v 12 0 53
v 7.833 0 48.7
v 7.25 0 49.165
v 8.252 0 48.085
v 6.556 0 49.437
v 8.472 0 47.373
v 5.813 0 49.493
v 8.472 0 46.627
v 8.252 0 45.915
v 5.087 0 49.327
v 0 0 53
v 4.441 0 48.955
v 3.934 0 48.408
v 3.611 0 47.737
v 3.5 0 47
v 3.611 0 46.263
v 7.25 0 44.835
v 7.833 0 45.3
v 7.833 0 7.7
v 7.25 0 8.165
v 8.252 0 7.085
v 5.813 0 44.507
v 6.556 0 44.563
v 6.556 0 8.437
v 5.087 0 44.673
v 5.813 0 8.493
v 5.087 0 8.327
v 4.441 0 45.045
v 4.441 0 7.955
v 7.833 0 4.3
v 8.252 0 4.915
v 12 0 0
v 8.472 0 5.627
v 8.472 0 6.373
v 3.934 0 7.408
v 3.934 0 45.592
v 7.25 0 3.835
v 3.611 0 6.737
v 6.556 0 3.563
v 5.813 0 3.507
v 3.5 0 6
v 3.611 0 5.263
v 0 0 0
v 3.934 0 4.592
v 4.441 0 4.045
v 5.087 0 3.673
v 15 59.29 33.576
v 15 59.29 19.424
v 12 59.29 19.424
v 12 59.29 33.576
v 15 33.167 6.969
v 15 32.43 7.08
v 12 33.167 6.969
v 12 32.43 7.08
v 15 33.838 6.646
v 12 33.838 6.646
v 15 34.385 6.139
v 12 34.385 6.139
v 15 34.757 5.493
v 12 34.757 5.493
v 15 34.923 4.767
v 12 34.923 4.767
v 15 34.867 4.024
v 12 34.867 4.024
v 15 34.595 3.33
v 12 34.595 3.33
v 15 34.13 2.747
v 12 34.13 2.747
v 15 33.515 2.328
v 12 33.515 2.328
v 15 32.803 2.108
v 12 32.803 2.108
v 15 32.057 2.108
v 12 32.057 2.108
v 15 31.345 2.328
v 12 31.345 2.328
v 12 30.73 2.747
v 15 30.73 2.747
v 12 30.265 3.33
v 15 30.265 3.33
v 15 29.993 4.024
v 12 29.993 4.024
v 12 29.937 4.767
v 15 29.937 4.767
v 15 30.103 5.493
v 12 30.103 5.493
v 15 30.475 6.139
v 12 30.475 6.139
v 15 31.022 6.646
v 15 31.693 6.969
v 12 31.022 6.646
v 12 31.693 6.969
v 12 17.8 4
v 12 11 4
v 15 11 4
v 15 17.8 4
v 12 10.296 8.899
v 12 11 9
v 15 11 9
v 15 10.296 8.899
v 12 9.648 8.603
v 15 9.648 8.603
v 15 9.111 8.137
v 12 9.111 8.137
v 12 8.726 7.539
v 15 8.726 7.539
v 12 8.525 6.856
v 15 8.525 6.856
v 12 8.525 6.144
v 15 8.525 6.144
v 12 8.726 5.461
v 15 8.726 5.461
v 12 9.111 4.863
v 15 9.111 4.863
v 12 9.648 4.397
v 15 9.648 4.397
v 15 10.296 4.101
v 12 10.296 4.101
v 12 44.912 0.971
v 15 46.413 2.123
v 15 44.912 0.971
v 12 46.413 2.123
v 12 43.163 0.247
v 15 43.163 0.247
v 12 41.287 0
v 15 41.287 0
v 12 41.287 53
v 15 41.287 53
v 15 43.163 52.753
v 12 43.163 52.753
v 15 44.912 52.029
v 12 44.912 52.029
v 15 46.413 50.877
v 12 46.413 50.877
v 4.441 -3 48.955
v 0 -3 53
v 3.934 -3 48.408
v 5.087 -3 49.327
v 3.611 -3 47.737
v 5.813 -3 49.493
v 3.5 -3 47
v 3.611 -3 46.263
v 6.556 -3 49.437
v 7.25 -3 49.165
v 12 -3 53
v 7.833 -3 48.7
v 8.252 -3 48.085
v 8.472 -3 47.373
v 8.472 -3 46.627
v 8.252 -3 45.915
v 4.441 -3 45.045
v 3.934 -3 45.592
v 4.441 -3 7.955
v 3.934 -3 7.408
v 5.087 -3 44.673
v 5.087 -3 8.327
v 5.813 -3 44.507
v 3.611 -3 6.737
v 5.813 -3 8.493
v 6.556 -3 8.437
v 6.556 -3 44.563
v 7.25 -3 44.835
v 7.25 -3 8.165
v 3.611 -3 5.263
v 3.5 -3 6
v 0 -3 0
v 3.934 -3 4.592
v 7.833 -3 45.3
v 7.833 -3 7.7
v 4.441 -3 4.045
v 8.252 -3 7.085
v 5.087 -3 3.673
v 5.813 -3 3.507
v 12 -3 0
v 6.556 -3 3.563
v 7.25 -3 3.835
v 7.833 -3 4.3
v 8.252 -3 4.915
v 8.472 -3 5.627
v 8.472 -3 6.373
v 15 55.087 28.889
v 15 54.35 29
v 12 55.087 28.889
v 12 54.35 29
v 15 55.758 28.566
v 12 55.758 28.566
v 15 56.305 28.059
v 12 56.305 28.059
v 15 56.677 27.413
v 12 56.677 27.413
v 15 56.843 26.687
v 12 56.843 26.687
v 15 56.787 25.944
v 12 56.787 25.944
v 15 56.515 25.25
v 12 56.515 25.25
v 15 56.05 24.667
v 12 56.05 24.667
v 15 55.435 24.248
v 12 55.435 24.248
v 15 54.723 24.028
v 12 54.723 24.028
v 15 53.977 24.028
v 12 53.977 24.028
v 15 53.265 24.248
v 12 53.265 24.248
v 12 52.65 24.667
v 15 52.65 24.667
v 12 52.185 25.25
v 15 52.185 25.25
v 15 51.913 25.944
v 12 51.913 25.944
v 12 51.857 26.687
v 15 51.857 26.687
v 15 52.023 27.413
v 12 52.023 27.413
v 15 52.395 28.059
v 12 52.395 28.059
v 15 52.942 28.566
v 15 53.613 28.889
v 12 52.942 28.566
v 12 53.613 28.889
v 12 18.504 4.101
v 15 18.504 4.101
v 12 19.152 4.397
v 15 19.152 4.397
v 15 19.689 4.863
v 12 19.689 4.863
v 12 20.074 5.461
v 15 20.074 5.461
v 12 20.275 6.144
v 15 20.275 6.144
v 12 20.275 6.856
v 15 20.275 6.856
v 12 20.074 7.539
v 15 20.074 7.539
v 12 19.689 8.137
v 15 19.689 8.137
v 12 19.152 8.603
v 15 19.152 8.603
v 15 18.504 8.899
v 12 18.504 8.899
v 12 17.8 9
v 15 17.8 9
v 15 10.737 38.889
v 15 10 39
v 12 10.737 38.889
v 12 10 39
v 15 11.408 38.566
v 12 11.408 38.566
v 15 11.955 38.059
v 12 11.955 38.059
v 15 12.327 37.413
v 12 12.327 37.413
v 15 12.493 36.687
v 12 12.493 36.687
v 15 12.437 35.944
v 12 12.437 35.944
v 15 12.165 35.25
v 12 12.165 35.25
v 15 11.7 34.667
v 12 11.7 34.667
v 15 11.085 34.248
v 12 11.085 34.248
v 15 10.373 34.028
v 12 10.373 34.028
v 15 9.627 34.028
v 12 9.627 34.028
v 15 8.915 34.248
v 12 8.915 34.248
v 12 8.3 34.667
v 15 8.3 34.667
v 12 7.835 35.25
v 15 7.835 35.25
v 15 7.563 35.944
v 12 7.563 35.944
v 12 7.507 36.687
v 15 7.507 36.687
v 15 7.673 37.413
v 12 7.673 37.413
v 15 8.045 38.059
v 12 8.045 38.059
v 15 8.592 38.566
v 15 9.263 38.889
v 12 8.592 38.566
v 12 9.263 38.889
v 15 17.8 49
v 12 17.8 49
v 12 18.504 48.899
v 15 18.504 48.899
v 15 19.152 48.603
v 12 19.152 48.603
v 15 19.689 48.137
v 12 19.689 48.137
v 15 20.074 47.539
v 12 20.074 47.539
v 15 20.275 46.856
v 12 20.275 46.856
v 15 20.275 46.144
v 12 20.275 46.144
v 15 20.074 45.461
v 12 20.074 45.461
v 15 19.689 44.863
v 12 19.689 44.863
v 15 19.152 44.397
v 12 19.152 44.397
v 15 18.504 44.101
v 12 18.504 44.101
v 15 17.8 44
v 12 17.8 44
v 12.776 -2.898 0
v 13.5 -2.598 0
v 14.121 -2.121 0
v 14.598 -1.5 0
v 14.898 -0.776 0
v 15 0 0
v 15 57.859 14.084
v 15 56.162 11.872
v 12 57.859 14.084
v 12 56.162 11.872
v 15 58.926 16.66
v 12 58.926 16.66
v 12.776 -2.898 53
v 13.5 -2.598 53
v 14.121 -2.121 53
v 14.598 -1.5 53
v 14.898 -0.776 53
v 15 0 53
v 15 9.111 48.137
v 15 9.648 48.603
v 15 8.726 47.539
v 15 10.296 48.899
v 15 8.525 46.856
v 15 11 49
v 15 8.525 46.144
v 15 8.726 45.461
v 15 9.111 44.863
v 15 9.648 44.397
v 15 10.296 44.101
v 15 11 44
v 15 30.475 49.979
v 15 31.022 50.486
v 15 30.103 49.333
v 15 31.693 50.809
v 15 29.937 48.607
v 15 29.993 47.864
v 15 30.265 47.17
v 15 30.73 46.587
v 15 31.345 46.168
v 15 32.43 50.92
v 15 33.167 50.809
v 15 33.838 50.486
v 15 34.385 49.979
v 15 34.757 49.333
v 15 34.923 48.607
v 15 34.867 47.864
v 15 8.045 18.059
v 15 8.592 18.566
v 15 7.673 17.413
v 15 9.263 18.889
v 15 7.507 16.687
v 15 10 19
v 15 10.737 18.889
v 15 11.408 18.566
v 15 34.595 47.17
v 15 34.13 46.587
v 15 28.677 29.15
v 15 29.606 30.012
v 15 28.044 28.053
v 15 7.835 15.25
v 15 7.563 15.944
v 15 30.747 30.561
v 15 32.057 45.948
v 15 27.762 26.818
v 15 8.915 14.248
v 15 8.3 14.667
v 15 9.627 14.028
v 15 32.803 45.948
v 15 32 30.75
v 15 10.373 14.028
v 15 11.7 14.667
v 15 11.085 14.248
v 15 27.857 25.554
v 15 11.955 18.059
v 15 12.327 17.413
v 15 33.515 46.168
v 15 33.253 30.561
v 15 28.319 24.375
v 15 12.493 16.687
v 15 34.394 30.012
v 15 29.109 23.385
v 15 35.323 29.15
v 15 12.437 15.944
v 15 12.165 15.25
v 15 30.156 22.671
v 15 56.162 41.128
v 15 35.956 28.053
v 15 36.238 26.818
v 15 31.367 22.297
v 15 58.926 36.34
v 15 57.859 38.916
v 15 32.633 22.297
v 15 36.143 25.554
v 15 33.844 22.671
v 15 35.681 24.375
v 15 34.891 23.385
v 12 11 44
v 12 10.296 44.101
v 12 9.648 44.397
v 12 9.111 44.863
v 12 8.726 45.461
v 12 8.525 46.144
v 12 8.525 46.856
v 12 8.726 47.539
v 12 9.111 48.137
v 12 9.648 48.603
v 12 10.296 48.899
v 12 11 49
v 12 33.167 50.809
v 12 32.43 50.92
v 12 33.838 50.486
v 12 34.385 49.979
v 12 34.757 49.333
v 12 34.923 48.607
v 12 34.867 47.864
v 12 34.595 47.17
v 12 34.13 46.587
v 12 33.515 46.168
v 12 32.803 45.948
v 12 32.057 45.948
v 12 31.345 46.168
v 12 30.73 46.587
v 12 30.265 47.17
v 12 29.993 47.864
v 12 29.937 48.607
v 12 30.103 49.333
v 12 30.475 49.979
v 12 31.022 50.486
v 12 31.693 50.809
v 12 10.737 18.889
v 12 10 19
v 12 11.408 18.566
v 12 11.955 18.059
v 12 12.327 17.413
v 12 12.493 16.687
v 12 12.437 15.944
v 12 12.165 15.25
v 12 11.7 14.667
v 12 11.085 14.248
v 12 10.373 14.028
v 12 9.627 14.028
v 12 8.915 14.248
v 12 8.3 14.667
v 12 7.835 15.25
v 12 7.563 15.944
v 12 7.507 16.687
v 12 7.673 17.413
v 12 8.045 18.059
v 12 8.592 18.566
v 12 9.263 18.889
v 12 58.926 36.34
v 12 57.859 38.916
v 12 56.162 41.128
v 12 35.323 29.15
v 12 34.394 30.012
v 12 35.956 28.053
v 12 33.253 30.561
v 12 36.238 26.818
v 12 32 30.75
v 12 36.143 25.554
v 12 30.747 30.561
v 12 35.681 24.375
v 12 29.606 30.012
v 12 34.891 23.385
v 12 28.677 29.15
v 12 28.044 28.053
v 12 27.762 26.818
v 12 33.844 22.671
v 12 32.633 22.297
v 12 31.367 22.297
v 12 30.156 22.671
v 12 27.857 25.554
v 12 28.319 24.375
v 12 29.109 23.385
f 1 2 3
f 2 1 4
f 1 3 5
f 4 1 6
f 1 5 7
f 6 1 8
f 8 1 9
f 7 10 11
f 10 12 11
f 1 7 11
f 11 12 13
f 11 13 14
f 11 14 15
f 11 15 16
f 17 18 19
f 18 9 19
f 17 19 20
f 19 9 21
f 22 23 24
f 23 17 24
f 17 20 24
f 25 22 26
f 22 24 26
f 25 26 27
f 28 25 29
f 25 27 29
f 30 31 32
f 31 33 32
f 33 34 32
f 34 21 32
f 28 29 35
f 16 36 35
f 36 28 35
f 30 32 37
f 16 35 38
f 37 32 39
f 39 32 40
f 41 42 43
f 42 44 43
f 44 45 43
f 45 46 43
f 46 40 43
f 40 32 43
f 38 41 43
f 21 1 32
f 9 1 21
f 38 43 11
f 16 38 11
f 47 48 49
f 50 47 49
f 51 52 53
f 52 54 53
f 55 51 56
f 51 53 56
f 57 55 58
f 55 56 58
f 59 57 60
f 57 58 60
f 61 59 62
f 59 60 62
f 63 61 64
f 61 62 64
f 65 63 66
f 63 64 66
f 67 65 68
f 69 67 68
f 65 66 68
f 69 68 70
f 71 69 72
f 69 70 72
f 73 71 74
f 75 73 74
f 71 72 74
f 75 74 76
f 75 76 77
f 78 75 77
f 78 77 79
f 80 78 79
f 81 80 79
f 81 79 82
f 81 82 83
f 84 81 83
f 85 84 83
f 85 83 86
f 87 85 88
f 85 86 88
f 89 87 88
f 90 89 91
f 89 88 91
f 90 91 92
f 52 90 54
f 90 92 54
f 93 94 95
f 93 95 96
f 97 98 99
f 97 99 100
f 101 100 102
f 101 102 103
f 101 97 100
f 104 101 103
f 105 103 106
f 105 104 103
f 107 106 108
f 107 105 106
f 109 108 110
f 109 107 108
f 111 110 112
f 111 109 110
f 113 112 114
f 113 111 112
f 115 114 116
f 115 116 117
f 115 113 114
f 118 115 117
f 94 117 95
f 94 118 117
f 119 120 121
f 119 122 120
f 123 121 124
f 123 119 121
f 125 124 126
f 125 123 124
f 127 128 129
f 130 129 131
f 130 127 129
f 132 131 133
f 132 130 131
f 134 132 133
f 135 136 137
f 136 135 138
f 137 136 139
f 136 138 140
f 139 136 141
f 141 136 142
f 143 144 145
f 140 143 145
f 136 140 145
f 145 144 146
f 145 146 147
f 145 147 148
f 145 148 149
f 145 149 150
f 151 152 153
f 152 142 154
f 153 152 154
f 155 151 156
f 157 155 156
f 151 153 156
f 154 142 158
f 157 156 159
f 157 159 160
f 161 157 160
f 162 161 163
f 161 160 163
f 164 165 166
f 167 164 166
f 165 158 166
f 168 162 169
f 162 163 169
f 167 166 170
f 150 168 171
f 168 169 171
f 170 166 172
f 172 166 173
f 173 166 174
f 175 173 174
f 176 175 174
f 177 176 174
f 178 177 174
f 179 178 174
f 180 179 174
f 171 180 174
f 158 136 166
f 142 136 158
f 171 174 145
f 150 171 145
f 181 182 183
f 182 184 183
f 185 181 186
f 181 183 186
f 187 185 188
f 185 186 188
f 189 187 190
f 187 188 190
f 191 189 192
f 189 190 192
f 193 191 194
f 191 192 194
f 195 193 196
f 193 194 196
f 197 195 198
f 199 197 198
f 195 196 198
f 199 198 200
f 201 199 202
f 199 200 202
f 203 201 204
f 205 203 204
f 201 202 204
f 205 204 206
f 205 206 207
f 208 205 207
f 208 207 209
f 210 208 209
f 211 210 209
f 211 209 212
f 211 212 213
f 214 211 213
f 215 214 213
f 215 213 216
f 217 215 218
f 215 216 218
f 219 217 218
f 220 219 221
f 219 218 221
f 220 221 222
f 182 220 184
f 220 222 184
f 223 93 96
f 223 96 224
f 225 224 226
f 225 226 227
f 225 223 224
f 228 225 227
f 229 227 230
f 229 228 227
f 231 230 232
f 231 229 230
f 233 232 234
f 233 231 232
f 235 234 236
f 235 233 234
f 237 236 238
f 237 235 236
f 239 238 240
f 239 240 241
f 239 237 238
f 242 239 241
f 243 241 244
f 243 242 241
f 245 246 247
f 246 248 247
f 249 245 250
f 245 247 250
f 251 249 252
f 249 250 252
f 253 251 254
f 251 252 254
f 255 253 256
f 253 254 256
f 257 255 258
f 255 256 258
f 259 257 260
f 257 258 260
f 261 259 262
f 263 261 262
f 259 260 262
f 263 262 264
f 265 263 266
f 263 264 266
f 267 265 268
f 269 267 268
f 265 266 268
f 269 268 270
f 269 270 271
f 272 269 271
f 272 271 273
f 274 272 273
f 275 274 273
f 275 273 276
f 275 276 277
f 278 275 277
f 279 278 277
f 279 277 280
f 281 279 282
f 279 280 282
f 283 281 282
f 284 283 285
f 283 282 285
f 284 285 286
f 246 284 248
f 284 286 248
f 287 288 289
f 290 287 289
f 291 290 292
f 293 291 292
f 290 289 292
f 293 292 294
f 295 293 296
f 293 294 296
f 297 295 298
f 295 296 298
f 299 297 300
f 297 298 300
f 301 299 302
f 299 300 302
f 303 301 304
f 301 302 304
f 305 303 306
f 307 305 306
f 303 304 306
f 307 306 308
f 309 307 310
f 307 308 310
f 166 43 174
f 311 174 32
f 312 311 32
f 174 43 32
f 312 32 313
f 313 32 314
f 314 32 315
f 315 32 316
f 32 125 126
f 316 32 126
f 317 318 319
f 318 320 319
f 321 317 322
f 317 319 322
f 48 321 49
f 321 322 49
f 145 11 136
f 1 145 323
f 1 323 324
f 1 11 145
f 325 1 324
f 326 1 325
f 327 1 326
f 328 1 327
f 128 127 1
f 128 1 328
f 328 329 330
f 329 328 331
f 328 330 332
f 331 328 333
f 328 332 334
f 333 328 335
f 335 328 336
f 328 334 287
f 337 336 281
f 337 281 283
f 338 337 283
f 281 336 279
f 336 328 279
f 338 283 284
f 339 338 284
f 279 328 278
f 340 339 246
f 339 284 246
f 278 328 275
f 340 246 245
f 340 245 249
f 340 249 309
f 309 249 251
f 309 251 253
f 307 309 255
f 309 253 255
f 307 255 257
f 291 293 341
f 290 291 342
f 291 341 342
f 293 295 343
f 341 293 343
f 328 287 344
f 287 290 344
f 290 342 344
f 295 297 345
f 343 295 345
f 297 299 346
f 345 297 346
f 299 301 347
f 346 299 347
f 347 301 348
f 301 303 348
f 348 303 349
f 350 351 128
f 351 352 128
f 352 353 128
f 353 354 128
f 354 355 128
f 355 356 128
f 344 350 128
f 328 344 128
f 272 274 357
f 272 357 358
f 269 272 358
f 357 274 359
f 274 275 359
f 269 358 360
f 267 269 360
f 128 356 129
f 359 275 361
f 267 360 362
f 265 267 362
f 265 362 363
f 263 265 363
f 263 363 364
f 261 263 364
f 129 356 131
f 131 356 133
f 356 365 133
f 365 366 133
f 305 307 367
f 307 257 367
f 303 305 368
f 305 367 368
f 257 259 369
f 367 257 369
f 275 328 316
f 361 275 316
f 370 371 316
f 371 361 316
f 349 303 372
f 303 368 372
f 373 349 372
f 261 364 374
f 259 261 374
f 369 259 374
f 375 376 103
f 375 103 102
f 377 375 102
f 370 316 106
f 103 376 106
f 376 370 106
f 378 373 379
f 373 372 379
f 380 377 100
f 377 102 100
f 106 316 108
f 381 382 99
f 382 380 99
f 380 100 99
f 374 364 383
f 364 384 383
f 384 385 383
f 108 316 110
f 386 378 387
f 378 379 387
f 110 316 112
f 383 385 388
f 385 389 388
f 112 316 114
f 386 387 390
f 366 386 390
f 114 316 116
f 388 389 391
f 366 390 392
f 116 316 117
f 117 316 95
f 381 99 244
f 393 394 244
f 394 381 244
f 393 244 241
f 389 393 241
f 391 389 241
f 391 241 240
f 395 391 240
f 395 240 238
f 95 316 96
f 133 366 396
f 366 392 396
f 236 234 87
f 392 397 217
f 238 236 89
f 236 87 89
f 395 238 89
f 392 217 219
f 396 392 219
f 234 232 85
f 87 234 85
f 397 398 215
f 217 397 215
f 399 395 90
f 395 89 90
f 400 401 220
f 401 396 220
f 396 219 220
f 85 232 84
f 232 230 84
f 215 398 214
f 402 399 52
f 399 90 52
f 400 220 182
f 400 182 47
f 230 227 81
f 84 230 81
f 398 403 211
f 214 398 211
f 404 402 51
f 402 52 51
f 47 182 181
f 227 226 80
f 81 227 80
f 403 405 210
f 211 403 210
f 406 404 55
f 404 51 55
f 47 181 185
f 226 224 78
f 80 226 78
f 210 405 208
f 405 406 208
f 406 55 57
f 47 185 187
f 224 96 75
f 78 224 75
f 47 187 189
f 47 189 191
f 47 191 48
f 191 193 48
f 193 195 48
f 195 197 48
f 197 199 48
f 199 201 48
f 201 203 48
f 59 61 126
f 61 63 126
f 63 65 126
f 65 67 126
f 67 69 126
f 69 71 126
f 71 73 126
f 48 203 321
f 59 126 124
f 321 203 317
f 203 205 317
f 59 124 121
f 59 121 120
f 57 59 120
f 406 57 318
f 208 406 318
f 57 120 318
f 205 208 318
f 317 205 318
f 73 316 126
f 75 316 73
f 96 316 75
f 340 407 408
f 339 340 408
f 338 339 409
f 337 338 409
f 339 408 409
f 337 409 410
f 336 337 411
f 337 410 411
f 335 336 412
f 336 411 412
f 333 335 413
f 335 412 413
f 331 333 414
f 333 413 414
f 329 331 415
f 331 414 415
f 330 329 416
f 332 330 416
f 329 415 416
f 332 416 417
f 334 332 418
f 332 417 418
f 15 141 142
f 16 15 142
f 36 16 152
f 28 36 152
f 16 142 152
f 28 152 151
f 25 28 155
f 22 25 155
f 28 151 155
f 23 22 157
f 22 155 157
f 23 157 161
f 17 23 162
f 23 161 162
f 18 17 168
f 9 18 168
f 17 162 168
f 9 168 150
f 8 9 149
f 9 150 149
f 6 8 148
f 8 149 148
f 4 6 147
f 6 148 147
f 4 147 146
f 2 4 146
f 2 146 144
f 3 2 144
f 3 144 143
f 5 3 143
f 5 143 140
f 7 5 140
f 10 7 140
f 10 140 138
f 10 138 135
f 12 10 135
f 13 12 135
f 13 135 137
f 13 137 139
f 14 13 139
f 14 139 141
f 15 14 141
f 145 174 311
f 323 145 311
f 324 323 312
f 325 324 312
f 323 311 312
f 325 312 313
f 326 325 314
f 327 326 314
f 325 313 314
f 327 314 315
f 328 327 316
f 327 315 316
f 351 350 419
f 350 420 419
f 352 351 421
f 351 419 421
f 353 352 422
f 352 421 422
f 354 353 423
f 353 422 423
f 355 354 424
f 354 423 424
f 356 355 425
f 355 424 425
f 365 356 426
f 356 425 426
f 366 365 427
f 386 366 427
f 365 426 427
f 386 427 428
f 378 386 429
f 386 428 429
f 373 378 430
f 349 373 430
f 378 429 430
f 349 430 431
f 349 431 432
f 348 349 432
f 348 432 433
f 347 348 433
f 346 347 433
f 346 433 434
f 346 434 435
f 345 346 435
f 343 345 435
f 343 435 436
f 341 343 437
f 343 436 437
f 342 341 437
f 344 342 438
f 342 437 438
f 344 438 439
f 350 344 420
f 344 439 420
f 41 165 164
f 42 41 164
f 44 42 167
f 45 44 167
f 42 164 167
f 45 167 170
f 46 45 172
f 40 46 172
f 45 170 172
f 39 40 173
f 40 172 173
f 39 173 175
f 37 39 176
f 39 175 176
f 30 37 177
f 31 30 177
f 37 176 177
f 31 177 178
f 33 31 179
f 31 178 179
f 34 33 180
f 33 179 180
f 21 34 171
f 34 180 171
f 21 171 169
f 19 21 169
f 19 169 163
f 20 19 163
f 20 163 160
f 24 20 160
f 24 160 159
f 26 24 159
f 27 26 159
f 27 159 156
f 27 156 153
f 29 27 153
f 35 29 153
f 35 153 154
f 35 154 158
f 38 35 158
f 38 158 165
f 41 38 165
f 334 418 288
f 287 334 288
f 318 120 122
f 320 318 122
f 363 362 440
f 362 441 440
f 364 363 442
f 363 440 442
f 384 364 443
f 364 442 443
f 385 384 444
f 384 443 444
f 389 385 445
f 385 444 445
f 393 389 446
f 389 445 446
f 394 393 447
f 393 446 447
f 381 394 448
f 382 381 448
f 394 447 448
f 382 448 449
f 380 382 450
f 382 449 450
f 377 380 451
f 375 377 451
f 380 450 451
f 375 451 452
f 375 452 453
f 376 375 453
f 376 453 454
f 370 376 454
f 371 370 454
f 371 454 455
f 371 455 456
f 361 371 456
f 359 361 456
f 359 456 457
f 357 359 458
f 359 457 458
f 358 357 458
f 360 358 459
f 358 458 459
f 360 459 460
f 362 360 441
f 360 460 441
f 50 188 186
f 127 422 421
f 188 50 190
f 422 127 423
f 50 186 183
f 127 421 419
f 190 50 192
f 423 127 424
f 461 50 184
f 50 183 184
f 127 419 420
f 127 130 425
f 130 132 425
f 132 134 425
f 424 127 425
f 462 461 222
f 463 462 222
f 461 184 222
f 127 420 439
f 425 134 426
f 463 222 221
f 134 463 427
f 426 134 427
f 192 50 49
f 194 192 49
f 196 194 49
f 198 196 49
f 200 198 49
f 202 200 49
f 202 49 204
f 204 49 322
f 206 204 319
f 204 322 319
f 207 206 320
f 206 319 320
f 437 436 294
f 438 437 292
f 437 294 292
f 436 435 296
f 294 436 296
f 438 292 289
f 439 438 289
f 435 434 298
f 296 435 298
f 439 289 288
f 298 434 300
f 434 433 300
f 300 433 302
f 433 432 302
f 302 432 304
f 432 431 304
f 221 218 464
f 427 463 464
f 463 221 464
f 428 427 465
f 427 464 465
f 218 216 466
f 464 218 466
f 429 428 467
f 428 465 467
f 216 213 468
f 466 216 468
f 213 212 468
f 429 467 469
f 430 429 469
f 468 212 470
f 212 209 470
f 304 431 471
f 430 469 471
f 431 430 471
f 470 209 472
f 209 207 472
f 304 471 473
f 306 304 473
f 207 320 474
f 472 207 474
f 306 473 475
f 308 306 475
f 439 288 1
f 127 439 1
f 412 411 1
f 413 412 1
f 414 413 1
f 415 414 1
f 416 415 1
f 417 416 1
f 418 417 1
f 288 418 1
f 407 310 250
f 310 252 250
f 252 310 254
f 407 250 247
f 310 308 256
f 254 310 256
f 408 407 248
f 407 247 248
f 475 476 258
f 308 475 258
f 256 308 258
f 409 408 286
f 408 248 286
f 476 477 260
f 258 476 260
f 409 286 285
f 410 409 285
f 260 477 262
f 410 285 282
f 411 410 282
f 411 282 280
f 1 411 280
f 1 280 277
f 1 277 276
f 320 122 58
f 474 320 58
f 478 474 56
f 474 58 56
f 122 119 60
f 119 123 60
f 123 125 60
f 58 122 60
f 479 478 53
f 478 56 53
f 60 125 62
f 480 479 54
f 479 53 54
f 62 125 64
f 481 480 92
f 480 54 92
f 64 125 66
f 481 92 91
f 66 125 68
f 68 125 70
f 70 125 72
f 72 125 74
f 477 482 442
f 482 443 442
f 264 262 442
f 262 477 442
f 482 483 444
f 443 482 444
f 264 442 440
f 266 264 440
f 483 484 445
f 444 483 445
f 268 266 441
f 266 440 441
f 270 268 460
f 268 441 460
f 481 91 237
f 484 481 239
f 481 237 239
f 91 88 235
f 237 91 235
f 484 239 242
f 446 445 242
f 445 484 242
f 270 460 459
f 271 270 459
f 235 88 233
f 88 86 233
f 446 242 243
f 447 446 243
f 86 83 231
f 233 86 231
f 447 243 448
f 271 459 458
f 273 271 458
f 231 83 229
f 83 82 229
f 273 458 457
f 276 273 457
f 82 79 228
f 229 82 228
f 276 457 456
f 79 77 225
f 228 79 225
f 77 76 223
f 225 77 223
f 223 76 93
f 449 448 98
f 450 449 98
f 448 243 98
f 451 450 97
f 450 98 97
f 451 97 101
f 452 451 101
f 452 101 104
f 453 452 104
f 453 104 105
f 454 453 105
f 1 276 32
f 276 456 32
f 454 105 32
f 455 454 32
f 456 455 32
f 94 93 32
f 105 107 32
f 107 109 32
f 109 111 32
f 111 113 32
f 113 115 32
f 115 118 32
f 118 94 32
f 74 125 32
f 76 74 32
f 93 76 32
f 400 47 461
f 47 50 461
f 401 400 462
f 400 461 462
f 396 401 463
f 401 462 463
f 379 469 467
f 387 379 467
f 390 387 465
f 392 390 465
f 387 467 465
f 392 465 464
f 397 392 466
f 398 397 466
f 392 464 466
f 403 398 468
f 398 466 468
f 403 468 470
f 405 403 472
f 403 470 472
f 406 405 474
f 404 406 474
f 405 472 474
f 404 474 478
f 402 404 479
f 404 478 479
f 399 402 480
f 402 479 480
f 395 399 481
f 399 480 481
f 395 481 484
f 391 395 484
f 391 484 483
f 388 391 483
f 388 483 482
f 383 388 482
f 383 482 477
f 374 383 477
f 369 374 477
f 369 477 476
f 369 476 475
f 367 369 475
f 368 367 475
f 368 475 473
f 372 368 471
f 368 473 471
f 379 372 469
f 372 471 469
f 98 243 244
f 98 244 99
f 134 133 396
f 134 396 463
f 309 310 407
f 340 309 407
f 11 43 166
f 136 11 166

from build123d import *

# Parameters (mm, degrees)
SM_BASE_FLANGE_1_DEPTH = 53
HOLE_WIZARD_M6_1_D     = 5
HOLE_WIZARD_M6_1_DEPTH = 3
HOLE_WIZARD_M6_1_TIP   = 1.502151548
HOLE_WIZARD_M6_2_D     = 5
HOLE_WIZARD_M6_2_DEPTH = 17
HOLE_WIZARD_M6_2_TIP   = 1.502151548
SKETCH_16_R            = 4.25
CUT_EXTRUDE_1_DEPTH    = 3
CHAMFER_1_SIZE         = 15
FILLET_1_R             = 10.68
FILLET_2_R             = 7.25


# Read off the part's stored shape, not the designer's step: 基体-法兰1
with BuildPart() as part:
    # 基体-法兰1 outline → 基体-法兰1 (new body)
    with BuildSketch(Plane.XY):
        with BuildLine():
            Line((15, 0), (15, 59.29))
            Line((15, 59.29), (12, 59.29))
            Line((12, 59.29), (12, 0))
            Line((12, 0), (0, 0))
            Line((0, 0), (0, -3))
            Line((0, -3), (12, -3))
            ThreePointArc((12, -3), (14.121320344, -2.121320344), (15, 0))
        make_face()
    extrude(amount=SM_BASE_FLANGE_1_DEPTH)

    # M6 螺纹孔1
    with Locations(Plane(origin=(15, 0, 0), x_dir=(0, 0, -1), z_dir=(1, 0, 0))):
        with Locations((-26.5, 54.35), (-48.42, 32.43), (-4.58, 32.43), (-36.5, 10), (-16.5, 10)):
            Hole(HOLE_WIZARD_M6_1_D / 2, depth=HOLE_WIZARD_M6_1_DEPTH)
            with Locations((0, 0, -(HOLE_WIZARD_M6_1_DEPTH + HOLE_WIZARD_M6_1_TIP / 2))):  # 118° drill point
                Cone(0, HOLE_WIZARD_M6_1_D / 2, HOLE_WIZARD_M6_1_TIP, mode=Mode.SUBTRACT)

    # M6 螺纹孔2
    with Locations(Plane(origin=(0, 0, 0), x_dir=(1, 0, 0), z_dir=(0, 1, 0))):
        with Locations((6, -6), (6, -47)):
            Hole(HOLE_WIZARD_M6_2_D / 2, depth=HOLE_WIZARD_M6_2_DEPTH)
            with Locations((0, 0, -(HOLE_WIZARD_M6_2_DEPTH + HOLE_WIZARD_M6_2_TIP / 2))):  # 118° drill point
                Cone(0, HOLE_WIZARD_M6_2_D / 2, HOLE_WIZARD_M6_2_TIP, mode=Mode.SUBTRACT)

    # 草图16 → 切除-拉伸1 (cut)
    with BuildSketch(Plane.ZY.offset(-12)):
        with Locations((26.5, 32)):
            Circle(SKETCH_16_R)
        with BuildLine():
            Line((44, 17.8), (44, 11))
            ThreePointArc((44, 11), (46.5, 8.5), (49, 11))
            Line((49, 11), (49, 17.8))
            ThreePointArc((49, 17.8), (46.5, 20.3), (44, 17.8))
        make_face()
        with BuildLine():
            Line((9, 17.8), (9, 11))
            ThreePointArc((9, 11), (6.5, 8.5), (4, 11))
            Line((4, 11), (4, 17.8))
            ThreePointArc((4, 17.8), (6.5, 20.3), (9, 17.8))
        make_face()
    extrude(amount=-CUT_EXTRUDE_1_DEPTH, mode=Mode.SUBTRACT)

    # 倒角1
    chamfer_1_edges = [part.edges().sort_by_distance(p)[0] for p in [
        (13.5, 59.29, 0),
        (13.5, 59.29, 53),
    ]]
    chamfer(chamfer_1_edges, length=CHAMFER_1_SIZE)

    # 圆角1
    fillet_1_edges = [part.edges().sort_by_distance(p)[0] for p in [
        (13.5, 59.29, 15),
        (13.5, 59.29, 38),
    ]]
    fillet(fillet_1_edges, radius=FILLET_1_R)

    # 圆角2
    fillet_2_edges = [part.edges().sort_by_distance(p)[0] for p in [
        (13.5, 44.29, 53),
        (13.5, 44.29, 0),
    ]]
    fillet(fillet_2_edges, radius=FILLET_2_R)


solid = part.part
